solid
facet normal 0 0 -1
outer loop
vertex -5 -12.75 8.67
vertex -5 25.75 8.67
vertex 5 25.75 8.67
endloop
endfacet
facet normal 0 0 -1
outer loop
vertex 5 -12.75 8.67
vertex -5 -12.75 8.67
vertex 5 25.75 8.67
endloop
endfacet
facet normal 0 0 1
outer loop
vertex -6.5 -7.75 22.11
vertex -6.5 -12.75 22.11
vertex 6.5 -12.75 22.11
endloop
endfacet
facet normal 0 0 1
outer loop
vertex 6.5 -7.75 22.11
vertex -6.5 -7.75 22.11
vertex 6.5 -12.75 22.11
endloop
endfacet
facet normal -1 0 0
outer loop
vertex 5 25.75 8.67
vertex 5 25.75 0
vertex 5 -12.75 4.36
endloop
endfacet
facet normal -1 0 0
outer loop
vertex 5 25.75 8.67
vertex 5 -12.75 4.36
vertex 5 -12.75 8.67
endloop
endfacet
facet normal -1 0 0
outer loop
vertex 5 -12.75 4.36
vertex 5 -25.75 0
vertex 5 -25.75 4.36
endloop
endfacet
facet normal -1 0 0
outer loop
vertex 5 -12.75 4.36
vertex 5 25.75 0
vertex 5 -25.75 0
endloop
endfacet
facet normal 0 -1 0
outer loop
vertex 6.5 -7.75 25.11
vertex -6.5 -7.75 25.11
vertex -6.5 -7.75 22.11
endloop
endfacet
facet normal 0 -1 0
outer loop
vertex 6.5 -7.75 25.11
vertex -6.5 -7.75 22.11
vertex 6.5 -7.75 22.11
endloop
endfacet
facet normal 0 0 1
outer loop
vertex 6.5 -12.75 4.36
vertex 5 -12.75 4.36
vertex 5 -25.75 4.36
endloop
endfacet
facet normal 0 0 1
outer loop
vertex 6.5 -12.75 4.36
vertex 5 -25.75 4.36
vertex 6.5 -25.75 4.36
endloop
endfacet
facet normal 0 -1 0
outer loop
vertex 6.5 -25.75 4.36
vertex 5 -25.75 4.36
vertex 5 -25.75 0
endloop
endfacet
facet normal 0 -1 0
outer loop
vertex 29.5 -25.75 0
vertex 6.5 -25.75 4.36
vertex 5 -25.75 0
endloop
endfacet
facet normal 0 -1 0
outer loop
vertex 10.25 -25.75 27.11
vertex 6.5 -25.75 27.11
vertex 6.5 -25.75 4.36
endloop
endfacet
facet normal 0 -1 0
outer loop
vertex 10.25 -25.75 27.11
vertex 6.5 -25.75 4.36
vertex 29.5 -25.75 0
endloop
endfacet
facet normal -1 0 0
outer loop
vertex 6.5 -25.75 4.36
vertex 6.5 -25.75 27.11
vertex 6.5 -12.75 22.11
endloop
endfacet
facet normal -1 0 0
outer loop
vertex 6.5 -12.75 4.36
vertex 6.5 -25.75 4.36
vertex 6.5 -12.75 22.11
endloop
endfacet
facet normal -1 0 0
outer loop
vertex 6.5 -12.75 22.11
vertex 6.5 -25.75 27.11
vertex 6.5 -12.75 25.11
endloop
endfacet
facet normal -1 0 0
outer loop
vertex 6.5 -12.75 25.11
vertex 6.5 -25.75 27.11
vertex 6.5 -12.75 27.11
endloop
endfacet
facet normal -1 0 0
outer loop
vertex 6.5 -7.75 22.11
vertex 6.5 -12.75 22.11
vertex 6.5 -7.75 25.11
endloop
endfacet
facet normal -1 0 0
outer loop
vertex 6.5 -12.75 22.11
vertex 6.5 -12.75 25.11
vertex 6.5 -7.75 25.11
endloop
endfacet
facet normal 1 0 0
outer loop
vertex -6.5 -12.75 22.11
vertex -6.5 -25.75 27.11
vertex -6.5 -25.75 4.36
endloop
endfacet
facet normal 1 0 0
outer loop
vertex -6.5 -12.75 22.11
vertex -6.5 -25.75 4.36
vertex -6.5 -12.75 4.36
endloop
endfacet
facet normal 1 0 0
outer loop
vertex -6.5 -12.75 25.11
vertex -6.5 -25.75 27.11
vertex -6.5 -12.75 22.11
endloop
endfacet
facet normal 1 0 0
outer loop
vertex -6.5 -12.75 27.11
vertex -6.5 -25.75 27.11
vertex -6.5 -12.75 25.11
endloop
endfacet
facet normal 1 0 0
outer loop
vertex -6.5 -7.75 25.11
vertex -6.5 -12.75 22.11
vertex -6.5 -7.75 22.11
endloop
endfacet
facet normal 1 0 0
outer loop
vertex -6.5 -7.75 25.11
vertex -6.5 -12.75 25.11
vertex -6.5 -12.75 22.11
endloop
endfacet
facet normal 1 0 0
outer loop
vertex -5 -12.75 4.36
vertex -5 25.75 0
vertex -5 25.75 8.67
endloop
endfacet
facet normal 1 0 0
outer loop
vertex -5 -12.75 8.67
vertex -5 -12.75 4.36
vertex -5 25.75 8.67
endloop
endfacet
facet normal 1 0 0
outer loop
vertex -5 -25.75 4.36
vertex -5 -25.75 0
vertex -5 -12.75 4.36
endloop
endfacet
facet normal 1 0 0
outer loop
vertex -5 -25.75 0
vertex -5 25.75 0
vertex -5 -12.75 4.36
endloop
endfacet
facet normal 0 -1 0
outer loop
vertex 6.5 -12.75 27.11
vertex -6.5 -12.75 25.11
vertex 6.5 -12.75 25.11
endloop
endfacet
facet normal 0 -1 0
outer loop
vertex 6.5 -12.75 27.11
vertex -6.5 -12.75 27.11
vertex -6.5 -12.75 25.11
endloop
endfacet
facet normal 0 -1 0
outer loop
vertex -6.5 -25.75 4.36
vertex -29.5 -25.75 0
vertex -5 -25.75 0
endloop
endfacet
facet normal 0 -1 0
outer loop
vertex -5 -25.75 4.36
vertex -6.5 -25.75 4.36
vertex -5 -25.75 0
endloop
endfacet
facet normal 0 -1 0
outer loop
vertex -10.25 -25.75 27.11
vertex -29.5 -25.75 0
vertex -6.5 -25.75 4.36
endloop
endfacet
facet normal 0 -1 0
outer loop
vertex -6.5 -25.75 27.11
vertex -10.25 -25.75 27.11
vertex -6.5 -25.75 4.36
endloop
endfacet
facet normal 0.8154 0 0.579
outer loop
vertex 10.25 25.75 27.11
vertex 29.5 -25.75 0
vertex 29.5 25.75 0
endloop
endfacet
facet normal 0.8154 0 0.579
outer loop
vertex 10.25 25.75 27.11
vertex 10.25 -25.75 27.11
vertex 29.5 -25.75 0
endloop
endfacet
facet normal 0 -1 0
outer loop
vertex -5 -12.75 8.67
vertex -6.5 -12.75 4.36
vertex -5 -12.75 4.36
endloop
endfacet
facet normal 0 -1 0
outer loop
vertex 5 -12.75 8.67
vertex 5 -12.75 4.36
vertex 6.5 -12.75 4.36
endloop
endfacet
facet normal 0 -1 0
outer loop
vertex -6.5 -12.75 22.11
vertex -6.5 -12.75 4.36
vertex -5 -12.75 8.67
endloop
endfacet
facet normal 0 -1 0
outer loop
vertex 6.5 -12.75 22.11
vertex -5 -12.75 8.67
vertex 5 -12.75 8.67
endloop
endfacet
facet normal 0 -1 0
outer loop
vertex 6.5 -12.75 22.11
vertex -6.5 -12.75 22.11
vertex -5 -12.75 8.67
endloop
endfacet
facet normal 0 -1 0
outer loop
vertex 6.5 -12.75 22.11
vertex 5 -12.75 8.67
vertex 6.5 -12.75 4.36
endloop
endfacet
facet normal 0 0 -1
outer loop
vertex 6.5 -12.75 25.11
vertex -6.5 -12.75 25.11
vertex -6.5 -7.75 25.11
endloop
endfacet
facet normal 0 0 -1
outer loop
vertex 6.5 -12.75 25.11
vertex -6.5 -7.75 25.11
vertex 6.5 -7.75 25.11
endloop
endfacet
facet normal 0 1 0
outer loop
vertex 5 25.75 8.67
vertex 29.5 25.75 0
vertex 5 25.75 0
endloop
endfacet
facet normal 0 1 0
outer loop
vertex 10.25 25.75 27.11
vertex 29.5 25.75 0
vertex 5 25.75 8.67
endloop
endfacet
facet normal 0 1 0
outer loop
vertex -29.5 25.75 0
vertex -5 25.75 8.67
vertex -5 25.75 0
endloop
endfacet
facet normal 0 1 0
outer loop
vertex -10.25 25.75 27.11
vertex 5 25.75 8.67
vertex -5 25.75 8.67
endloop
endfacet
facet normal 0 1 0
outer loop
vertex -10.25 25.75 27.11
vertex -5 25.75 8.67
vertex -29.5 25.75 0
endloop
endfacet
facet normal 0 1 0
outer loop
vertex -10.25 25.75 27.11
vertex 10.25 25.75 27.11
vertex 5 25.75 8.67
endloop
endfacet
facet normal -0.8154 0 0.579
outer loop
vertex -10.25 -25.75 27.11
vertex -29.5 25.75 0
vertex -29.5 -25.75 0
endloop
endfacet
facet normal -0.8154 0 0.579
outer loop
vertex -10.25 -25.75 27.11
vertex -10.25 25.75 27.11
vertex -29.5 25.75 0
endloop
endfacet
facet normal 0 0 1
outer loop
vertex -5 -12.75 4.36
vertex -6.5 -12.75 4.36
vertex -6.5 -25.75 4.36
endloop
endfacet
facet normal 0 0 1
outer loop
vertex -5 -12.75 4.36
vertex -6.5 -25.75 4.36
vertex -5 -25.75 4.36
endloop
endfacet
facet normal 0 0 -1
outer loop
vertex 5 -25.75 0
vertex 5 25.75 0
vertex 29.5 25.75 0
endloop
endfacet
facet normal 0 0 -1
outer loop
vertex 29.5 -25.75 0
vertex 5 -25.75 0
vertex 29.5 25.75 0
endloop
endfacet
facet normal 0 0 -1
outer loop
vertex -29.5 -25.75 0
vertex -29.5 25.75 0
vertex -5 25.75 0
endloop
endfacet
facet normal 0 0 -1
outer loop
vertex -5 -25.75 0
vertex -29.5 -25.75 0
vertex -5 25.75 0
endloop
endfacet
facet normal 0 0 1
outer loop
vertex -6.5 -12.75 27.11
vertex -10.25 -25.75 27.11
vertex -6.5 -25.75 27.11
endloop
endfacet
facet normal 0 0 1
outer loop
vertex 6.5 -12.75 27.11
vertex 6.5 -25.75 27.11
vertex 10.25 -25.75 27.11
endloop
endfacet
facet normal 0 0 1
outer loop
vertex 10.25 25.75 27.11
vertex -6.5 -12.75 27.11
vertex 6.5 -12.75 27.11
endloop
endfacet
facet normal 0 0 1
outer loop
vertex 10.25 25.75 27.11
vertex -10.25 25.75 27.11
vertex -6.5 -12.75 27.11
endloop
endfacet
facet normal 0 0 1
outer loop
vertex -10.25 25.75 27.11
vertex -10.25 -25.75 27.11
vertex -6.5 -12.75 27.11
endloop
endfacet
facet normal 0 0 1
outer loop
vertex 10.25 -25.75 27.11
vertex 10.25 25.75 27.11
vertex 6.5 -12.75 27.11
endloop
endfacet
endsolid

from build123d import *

# Parameters (mm, degrees)
F1_W      = 20.5
F1_H      = 51.5
F2_DEPTH  = 27.11
F4_W      = 59
F4_H      = 51.5
F3_W      = 20.5
F3_H      = 51.5
F6_W      = 10
F6_H      = 13
F7_DEPTH  = 27.11
F8_W      = 13
F8_H      = 13
F9_DEPTH  = 22.75
F10_W     = 10
F10_H     = 8.67
F11_DEPTH = 38.5
F12_W     = 13
F12_H     = 3
F13_DEPTH = 5


with BuildPart() as f2:
    # F1 (on face) → F2 (new body)
    with BuildSketch(Plane.XY):
        Rectangle(F1_W, F1_H)
    extrude(amount=F2_DEPTH)

    # F4 (on face) → F5 section 0
    with BuildSketch(Plane.XY):
        Rectangle(F4_W, F4_H)
    # F3 (on face) → F5 section 1
    with BuildSketch(Plane.XY.offset(27.11)):
        Rectangle(F3_W, F3_H)
    loft()

    # F6 (on face) → F7 (cut, through all)
    with BuildSketch(Plane.XY.offset(27.11)):
        with Locations((0, -19.25)):
            Rectangle(F6_W, F6_H)
    extrude(amount=-F7_DEPTH, mode=Mode.SUBTRACT)

    # F8 (on face) → F9 (cut)
    with BuildSketch(Plane.XY.offset(27.11)):
        with Locations((0, -19.25)):
            Rectangle(F8_W, F8_H)
    extrude(amount=-F9_DEPTH, mode=Mode.SUBTRACT)

    # F10 (on face) → F11 (cut, through all)
    with BuildSketch(Plane.XZ.offset(12.75)):
        with Locations((0, 4.335)):
            Rectangle(F10_W, F10_H)
    extrude(amount=-F11_DEPTH, mode=Mode.SUBTRACT)

    # F12 (on face) → F13 (cut)
    with BuildSketch(Plane.XZ.offset(12.75)):
        with Locations((0, 23.61)):
            Rectangle(F12_W, F12_H)
    extrude(amount=-F13_DEPTH, mode=Mode.SUBTRACT)


solid = f2.part
